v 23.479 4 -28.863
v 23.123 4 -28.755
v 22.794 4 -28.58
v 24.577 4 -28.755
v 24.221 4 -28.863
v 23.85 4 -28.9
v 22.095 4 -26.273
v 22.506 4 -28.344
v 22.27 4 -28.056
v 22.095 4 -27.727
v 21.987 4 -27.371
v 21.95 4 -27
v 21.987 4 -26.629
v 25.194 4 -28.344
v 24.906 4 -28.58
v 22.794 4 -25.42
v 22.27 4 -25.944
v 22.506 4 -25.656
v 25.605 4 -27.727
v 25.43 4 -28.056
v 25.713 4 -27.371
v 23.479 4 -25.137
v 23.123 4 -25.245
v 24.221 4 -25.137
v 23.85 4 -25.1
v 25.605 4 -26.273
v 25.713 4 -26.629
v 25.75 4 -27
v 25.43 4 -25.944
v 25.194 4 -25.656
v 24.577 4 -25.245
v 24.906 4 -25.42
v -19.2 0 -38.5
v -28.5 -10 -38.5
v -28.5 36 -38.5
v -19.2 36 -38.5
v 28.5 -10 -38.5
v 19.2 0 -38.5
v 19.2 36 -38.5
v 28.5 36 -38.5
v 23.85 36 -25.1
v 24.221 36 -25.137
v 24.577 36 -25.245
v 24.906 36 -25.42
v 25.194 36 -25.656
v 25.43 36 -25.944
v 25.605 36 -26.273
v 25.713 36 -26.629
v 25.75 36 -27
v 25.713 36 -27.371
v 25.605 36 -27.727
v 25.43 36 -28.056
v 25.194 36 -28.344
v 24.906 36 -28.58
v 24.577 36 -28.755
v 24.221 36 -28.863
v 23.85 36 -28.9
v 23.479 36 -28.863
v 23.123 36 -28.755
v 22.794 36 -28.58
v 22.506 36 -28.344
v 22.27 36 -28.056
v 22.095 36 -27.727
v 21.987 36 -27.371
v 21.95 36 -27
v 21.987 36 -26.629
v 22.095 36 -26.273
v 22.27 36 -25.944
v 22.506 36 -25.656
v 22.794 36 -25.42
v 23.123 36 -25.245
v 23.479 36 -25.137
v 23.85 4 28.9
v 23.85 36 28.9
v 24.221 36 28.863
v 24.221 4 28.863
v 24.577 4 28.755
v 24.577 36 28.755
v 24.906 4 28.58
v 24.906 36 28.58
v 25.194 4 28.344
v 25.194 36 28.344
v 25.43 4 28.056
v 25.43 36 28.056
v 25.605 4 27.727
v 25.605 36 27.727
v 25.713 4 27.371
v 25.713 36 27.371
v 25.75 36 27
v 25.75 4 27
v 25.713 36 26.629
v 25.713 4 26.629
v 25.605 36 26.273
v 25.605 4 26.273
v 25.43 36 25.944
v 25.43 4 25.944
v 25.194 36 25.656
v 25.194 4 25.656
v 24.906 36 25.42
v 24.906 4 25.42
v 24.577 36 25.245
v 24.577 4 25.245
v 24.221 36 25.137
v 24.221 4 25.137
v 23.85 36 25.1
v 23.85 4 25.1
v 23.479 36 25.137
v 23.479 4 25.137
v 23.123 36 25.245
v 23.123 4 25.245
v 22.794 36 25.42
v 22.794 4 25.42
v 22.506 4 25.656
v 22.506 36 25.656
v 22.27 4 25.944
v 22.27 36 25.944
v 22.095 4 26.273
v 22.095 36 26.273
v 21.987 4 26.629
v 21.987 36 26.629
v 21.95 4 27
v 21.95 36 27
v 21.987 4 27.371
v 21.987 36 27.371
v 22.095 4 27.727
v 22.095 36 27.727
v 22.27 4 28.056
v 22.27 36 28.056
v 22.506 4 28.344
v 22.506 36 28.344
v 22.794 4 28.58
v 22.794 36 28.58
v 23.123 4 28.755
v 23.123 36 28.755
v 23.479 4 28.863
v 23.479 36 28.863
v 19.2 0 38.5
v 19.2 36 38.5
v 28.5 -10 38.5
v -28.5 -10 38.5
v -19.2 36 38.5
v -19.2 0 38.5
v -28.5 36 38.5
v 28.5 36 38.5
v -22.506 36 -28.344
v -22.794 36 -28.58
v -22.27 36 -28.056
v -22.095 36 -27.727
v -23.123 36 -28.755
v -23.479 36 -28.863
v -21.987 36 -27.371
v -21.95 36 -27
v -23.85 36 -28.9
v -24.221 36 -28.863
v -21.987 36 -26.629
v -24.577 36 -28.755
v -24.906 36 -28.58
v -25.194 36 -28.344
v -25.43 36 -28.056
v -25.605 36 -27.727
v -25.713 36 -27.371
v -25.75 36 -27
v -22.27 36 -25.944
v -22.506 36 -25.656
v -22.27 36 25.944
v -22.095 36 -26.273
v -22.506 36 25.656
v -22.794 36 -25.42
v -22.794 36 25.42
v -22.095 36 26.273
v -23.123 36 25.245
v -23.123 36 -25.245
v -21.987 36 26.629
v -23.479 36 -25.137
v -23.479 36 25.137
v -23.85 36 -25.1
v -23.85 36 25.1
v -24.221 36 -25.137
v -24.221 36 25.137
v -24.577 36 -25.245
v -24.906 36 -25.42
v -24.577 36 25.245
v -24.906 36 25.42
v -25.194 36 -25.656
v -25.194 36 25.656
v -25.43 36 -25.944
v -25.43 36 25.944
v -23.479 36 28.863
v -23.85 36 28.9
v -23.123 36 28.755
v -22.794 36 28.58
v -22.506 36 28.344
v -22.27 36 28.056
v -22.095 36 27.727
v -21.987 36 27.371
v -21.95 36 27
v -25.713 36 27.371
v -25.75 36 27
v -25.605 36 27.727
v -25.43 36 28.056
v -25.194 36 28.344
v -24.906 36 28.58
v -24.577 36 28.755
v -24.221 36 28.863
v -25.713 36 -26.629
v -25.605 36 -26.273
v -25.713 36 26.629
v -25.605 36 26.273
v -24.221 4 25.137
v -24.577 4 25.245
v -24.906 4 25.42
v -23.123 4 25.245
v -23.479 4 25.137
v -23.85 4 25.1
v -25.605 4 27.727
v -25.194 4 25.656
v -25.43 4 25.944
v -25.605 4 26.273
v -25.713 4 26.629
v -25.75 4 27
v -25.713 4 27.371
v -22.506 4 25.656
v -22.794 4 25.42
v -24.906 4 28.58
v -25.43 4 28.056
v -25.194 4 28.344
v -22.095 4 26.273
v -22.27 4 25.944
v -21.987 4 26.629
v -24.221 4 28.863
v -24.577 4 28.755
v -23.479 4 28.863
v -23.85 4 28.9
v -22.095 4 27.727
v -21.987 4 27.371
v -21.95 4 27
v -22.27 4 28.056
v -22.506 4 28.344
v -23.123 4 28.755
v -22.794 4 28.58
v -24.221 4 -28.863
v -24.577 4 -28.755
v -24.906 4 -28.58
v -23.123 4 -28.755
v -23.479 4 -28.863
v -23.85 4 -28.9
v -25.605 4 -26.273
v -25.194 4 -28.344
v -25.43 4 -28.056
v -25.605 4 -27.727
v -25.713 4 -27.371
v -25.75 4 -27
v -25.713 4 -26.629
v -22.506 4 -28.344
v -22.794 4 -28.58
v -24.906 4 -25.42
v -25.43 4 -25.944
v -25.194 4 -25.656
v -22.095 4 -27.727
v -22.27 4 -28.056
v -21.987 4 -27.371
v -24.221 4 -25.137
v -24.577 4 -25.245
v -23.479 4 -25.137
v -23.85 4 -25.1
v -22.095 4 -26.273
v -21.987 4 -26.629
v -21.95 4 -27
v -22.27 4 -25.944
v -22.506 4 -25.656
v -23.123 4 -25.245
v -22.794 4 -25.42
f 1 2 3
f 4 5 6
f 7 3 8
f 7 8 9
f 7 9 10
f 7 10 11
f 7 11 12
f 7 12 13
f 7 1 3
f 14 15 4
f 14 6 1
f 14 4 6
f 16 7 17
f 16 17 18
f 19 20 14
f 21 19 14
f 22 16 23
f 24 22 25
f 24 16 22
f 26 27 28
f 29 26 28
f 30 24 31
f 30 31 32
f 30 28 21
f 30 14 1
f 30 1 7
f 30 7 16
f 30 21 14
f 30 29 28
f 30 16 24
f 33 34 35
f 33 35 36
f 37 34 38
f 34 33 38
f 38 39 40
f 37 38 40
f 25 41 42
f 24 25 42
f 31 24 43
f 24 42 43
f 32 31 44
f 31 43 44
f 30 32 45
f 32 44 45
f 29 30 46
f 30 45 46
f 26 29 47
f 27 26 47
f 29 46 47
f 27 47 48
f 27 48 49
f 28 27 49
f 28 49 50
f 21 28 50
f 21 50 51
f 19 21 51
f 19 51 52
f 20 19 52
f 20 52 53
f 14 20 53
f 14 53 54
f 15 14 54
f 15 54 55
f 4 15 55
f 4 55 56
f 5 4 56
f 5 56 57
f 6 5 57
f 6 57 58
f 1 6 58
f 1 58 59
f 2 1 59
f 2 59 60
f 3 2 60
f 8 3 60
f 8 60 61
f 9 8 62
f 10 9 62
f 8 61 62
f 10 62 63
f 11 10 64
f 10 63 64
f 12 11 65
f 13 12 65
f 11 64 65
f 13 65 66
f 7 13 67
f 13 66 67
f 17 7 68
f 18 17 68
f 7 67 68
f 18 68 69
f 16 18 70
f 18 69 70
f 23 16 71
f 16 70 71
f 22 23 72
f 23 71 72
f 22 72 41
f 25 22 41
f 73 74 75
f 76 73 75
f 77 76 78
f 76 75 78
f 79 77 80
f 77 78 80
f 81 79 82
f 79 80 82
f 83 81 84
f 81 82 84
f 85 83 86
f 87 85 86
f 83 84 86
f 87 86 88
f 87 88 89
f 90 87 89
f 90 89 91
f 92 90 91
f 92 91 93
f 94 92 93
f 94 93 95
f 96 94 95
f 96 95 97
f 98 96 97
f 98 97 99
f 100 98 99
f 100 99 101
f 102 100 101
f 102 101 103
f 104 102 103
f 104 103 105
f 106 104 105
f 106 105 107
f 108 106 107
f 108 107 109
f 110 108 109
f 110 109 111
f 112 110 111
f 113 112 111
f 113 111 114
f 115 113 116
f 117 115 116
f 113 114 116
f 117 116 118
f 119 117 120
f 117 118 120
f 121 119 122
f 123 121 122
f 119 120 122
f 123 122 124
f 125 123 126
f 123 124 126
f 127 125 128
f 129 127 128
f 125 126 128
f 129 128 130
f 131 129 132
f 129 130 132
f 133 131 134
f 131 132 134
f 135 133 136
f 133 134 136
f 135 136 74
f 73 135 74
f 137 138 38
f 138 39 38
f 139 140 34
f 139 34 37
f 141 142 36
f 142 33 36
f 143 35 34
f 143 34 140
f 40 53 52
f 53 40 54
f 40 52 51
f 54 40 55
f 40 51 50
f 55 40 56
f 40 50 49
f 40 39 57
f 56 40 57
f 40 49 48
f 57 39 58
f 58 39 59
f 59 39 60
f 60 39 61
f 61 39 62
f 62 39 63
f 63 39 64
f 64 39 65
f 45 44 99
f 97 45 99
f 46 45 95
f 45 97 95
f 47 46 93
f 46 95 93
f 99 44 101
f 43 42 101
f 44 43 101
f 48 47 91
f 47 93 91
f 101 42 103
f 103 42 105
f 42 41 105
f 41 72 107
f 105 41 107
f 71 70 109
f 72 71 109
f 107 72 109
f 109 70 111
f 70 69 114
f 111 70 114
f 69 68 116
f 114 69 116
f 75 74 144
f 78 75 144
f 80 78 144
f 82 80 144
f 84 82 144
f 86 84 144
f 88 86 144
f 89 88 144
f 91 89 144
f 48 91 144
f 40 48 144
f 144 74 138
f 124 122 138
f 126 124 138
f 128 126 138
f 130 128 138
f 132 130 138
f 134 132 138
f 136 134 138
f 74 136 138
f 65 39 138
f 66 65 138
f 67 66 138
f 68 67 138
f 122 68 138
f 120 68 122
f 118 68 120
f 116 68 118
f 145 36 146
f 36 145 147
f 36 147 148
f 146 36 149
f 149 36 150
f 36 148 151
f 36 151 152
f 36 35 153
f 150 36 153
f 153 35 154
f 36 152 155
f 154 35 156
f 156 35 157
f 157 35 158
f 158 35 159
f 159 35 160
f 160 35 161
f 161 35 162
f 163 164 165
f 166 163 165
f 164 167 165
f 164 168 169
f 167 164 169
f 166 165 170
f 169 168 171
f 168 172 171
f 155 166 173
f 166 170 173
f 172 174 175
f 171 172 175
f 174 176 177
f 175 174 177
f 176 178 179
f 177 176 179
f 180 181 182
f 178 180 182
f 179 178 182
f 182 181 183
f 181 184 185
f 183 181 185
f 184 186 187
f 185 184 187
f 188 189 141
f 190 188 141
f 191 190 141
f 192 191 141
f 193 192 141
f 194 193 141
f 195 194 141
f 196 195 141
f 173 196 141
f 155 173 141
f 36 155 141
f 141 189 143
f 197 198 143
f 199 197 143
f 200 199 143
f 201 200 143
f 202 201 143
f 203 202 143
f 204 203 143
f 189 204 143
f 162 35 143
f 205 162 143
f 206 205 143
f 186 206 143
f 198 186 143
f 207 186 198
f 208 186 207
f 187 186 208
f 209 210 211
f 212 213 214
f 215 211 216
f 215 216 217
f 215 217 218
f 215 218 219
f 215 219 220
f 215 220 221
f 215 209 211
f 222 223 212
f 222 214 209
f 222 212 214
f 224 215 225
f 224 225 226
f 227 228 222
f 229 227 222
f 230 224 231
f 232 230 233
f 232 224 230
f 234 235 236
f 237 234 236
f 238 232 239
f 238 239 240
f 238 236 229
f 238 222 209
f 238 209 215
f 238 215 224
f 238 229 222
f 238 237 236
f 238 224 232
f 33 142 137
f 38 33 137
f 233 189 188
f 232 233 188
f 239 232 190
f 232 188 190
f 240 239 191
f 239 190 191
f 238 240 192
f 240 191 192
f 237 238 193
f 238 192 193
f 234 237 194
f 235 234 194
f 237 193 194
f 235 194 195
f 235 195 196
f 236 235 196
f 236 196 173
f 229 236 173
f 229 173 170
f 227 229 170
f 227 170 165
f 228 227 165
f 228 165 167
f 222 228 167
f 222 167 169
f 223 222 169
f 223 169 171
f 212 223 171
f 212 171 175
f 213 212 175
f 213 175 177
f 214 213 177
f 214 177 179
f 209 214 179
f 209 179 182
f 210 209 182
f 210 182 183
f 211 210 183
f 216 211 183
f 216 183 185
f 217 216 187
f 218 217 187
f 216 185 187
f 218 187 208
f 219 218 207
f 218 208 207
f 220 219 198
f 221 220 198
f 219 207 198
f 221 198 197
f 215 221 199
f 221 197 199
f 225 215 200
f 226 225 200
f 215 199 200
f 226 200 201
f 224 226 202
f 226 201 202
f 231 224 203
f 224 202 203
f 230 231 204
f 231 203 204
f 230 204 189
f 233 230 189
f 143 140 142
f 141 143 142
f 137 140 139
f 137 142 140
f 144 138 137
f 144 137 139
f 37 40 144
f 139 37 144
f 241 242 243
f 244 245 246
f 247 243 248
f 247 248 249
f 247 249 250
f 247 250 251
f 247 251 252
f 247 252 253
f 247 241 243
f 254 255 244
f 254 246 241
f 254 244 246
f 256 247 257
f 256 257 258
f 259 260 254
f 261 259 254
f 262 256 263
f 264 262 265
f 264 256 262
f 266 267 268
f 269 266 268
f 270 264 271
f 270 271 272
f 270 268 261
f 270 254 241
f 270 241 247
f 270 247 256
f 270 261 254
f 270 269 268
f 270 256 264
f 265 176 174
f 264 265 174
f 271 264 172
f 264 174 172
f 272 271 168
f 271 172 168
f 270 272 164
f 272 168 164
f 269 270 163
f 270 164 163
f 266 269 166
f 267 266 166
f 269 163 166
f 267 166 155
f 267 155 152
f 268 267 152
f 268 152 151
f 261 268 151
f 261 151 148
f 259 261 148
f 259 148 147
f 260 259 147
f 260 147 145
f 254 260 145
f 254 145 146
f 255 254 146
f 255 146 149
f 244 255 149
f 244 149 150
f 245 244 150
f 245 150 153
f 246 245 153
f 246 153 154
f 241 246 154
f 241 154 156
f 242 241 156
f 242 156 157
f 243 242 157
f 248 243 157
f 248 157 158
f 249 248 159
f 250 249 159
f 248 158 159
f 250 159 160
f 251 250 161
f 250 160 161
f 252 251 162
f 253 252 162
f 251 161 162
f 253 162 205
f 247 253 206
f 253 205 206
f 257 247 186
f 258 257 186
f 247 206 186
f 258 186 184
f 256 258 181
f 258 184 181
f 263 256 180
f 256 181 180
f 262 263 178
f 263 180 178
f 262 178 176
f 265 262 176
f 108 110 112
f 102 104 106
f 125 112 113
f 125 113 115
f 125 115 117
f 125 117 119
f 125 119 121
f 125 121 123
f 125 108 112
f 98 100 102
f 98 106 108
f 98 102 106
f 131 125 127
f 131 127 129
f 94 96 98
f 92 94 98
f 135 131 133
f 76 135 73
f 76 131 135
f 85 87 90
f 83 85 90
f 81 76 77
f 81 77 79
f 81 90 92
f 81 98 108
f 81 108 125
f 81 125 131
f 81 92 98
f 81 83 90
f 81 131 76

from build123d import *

# Parameters (mm, degrees)
SKETCH1_W           = 57
SKETCH1_H           = 37
BOSS_EXTRUDE1_DEPTH = 44
SKETCH2_W           = 38.4
SKETCH2_H           = 36
CUT_EXTRUDE1_DEPTH  = 47
BOSS_EXTRUDE2_DEPTH = 20
BOSS_EXTRUDE3_DEPTH = 20
SKETCH7_W           = 53
SKETCH7_H           = 31
CUT_EXTRUDE4_DEPTH  = 8
SKETCH8_R           = 1.9
CUT_EXTRUDE5_DEPTH  = 40
SKETCH10_W          = 57
SKETCH10_H          = 77
BOSS_EXTRUDE4_DEPTH = 10
SKETCH11_W          = 77
SKETCH11_H          = 8
CUT_EXTRUDE8_DEPTH  = 100


with BuildPart() as part:
    # Sketch1 → Boss-Extrude1 (new body)
    with BuildSketch(Plane(origin=(0, 0, 0), x_dir=(1, 0, 0), z_dir=(0, 1, 0))):
        Rectangle(SKETCH1_W, SKETCH1_H)
    extrude(amount=BOSS_EXTRUDE1_DEPTH)

    # Sketch2 → Cut-Extrude1 (cut)
    with BuildSketch(Plane.XY.offset(18.5)):
        with Locations((0, 18)):
            Rectangle(SKETCH2_W, SKETCH2_H)
    extrude(amount=-CUT_EXTRUDE1_DEPTH, mode=Mode.SUBTRACT)

    # Sketch5 → Boss-Extrude2 (add)
    with BuildSketch(Plane(origin=(0, 0, -18.5), x_dir=(-1, 0, 0), z_dir=(0, 0, -1))):
        Polygon((-19.2, 36), (19.2, 36), (19.2, 0), (28.5, 0), (28.5, 44), (-28.5, 44), (-28.5, 0), (-19.2, 0), align=None)
    extrude(amount=BOSS_EXTRUDE2_DEPTH)

    # Sketch6 → Boss-Extrude3 (add)
    with BuildSketch(Plane.XY.offset(18.5)):
        Polygon((-28.5, 0), (-19.2, 0), (-19.2, 36), (19.2, 36), (19.2, 0), (28.5, 0), (28.5, 44), (-28.5, 44), align=None)
    extrude(amount=BOSS_EXTRUDE3_DEPTH)

    # Sketch7 → Cut-Extrude4 (cut)
    with BuildSketch(Plane(origin=(0, 44, 0), x_dir=(1, 0, 0), z_dir=(0, 1, 0))):
        with Locations((-2, 0)):
            Rectangle(SKETCH7_W, SKETCH7_H)
    extrude(amount=-CUT_EXTRUDE4_DEPTH, mode=Mode.SUBTRACT)

    # Sketch8 → Cut-Extrude5 (cut)
    with BuildSketch(Plane(origin=(0, 44, 0), x_dir=(1, 0, 0), z_dir=(0, 1, 0))):
        with Locations((-23.85, 27)):
            Circle(SKETCH8_R)
        with Locations((23.85, 27)):
            Circle(SKETCH8_R)
        with Locations((-23.85, -27)):
            Circle(SKETCH8_R)
        with Locations((23.85, -27)):
            Circle(SKETCH8_R)
    extrude(amount=-CUT_EXTRUDE5_DEPTH, mode=Mode.SUBTRACT)

    # Sketch10 → Boss-Extrude4 (add)
    with BuildSketch(Plane.XZ):
        Rectangle(SKETCH10_W, SKETCH10_H)
    extrude(amount=BOSS_EXTRUDE4_DEPTH)

    # Sketch11 → Cut-Extrude8 (cut)
    with BuildSketch(Plane.ZY.offset(28.5)):
        with Locations((0, 40)):
            Rectangle(SKETCH11_W, SKETCH11_H)
    extrude(amount=-CUT_EXTRUDE8_DEPTH, mode=Mode.SUBTRACT)


solid = part.part
